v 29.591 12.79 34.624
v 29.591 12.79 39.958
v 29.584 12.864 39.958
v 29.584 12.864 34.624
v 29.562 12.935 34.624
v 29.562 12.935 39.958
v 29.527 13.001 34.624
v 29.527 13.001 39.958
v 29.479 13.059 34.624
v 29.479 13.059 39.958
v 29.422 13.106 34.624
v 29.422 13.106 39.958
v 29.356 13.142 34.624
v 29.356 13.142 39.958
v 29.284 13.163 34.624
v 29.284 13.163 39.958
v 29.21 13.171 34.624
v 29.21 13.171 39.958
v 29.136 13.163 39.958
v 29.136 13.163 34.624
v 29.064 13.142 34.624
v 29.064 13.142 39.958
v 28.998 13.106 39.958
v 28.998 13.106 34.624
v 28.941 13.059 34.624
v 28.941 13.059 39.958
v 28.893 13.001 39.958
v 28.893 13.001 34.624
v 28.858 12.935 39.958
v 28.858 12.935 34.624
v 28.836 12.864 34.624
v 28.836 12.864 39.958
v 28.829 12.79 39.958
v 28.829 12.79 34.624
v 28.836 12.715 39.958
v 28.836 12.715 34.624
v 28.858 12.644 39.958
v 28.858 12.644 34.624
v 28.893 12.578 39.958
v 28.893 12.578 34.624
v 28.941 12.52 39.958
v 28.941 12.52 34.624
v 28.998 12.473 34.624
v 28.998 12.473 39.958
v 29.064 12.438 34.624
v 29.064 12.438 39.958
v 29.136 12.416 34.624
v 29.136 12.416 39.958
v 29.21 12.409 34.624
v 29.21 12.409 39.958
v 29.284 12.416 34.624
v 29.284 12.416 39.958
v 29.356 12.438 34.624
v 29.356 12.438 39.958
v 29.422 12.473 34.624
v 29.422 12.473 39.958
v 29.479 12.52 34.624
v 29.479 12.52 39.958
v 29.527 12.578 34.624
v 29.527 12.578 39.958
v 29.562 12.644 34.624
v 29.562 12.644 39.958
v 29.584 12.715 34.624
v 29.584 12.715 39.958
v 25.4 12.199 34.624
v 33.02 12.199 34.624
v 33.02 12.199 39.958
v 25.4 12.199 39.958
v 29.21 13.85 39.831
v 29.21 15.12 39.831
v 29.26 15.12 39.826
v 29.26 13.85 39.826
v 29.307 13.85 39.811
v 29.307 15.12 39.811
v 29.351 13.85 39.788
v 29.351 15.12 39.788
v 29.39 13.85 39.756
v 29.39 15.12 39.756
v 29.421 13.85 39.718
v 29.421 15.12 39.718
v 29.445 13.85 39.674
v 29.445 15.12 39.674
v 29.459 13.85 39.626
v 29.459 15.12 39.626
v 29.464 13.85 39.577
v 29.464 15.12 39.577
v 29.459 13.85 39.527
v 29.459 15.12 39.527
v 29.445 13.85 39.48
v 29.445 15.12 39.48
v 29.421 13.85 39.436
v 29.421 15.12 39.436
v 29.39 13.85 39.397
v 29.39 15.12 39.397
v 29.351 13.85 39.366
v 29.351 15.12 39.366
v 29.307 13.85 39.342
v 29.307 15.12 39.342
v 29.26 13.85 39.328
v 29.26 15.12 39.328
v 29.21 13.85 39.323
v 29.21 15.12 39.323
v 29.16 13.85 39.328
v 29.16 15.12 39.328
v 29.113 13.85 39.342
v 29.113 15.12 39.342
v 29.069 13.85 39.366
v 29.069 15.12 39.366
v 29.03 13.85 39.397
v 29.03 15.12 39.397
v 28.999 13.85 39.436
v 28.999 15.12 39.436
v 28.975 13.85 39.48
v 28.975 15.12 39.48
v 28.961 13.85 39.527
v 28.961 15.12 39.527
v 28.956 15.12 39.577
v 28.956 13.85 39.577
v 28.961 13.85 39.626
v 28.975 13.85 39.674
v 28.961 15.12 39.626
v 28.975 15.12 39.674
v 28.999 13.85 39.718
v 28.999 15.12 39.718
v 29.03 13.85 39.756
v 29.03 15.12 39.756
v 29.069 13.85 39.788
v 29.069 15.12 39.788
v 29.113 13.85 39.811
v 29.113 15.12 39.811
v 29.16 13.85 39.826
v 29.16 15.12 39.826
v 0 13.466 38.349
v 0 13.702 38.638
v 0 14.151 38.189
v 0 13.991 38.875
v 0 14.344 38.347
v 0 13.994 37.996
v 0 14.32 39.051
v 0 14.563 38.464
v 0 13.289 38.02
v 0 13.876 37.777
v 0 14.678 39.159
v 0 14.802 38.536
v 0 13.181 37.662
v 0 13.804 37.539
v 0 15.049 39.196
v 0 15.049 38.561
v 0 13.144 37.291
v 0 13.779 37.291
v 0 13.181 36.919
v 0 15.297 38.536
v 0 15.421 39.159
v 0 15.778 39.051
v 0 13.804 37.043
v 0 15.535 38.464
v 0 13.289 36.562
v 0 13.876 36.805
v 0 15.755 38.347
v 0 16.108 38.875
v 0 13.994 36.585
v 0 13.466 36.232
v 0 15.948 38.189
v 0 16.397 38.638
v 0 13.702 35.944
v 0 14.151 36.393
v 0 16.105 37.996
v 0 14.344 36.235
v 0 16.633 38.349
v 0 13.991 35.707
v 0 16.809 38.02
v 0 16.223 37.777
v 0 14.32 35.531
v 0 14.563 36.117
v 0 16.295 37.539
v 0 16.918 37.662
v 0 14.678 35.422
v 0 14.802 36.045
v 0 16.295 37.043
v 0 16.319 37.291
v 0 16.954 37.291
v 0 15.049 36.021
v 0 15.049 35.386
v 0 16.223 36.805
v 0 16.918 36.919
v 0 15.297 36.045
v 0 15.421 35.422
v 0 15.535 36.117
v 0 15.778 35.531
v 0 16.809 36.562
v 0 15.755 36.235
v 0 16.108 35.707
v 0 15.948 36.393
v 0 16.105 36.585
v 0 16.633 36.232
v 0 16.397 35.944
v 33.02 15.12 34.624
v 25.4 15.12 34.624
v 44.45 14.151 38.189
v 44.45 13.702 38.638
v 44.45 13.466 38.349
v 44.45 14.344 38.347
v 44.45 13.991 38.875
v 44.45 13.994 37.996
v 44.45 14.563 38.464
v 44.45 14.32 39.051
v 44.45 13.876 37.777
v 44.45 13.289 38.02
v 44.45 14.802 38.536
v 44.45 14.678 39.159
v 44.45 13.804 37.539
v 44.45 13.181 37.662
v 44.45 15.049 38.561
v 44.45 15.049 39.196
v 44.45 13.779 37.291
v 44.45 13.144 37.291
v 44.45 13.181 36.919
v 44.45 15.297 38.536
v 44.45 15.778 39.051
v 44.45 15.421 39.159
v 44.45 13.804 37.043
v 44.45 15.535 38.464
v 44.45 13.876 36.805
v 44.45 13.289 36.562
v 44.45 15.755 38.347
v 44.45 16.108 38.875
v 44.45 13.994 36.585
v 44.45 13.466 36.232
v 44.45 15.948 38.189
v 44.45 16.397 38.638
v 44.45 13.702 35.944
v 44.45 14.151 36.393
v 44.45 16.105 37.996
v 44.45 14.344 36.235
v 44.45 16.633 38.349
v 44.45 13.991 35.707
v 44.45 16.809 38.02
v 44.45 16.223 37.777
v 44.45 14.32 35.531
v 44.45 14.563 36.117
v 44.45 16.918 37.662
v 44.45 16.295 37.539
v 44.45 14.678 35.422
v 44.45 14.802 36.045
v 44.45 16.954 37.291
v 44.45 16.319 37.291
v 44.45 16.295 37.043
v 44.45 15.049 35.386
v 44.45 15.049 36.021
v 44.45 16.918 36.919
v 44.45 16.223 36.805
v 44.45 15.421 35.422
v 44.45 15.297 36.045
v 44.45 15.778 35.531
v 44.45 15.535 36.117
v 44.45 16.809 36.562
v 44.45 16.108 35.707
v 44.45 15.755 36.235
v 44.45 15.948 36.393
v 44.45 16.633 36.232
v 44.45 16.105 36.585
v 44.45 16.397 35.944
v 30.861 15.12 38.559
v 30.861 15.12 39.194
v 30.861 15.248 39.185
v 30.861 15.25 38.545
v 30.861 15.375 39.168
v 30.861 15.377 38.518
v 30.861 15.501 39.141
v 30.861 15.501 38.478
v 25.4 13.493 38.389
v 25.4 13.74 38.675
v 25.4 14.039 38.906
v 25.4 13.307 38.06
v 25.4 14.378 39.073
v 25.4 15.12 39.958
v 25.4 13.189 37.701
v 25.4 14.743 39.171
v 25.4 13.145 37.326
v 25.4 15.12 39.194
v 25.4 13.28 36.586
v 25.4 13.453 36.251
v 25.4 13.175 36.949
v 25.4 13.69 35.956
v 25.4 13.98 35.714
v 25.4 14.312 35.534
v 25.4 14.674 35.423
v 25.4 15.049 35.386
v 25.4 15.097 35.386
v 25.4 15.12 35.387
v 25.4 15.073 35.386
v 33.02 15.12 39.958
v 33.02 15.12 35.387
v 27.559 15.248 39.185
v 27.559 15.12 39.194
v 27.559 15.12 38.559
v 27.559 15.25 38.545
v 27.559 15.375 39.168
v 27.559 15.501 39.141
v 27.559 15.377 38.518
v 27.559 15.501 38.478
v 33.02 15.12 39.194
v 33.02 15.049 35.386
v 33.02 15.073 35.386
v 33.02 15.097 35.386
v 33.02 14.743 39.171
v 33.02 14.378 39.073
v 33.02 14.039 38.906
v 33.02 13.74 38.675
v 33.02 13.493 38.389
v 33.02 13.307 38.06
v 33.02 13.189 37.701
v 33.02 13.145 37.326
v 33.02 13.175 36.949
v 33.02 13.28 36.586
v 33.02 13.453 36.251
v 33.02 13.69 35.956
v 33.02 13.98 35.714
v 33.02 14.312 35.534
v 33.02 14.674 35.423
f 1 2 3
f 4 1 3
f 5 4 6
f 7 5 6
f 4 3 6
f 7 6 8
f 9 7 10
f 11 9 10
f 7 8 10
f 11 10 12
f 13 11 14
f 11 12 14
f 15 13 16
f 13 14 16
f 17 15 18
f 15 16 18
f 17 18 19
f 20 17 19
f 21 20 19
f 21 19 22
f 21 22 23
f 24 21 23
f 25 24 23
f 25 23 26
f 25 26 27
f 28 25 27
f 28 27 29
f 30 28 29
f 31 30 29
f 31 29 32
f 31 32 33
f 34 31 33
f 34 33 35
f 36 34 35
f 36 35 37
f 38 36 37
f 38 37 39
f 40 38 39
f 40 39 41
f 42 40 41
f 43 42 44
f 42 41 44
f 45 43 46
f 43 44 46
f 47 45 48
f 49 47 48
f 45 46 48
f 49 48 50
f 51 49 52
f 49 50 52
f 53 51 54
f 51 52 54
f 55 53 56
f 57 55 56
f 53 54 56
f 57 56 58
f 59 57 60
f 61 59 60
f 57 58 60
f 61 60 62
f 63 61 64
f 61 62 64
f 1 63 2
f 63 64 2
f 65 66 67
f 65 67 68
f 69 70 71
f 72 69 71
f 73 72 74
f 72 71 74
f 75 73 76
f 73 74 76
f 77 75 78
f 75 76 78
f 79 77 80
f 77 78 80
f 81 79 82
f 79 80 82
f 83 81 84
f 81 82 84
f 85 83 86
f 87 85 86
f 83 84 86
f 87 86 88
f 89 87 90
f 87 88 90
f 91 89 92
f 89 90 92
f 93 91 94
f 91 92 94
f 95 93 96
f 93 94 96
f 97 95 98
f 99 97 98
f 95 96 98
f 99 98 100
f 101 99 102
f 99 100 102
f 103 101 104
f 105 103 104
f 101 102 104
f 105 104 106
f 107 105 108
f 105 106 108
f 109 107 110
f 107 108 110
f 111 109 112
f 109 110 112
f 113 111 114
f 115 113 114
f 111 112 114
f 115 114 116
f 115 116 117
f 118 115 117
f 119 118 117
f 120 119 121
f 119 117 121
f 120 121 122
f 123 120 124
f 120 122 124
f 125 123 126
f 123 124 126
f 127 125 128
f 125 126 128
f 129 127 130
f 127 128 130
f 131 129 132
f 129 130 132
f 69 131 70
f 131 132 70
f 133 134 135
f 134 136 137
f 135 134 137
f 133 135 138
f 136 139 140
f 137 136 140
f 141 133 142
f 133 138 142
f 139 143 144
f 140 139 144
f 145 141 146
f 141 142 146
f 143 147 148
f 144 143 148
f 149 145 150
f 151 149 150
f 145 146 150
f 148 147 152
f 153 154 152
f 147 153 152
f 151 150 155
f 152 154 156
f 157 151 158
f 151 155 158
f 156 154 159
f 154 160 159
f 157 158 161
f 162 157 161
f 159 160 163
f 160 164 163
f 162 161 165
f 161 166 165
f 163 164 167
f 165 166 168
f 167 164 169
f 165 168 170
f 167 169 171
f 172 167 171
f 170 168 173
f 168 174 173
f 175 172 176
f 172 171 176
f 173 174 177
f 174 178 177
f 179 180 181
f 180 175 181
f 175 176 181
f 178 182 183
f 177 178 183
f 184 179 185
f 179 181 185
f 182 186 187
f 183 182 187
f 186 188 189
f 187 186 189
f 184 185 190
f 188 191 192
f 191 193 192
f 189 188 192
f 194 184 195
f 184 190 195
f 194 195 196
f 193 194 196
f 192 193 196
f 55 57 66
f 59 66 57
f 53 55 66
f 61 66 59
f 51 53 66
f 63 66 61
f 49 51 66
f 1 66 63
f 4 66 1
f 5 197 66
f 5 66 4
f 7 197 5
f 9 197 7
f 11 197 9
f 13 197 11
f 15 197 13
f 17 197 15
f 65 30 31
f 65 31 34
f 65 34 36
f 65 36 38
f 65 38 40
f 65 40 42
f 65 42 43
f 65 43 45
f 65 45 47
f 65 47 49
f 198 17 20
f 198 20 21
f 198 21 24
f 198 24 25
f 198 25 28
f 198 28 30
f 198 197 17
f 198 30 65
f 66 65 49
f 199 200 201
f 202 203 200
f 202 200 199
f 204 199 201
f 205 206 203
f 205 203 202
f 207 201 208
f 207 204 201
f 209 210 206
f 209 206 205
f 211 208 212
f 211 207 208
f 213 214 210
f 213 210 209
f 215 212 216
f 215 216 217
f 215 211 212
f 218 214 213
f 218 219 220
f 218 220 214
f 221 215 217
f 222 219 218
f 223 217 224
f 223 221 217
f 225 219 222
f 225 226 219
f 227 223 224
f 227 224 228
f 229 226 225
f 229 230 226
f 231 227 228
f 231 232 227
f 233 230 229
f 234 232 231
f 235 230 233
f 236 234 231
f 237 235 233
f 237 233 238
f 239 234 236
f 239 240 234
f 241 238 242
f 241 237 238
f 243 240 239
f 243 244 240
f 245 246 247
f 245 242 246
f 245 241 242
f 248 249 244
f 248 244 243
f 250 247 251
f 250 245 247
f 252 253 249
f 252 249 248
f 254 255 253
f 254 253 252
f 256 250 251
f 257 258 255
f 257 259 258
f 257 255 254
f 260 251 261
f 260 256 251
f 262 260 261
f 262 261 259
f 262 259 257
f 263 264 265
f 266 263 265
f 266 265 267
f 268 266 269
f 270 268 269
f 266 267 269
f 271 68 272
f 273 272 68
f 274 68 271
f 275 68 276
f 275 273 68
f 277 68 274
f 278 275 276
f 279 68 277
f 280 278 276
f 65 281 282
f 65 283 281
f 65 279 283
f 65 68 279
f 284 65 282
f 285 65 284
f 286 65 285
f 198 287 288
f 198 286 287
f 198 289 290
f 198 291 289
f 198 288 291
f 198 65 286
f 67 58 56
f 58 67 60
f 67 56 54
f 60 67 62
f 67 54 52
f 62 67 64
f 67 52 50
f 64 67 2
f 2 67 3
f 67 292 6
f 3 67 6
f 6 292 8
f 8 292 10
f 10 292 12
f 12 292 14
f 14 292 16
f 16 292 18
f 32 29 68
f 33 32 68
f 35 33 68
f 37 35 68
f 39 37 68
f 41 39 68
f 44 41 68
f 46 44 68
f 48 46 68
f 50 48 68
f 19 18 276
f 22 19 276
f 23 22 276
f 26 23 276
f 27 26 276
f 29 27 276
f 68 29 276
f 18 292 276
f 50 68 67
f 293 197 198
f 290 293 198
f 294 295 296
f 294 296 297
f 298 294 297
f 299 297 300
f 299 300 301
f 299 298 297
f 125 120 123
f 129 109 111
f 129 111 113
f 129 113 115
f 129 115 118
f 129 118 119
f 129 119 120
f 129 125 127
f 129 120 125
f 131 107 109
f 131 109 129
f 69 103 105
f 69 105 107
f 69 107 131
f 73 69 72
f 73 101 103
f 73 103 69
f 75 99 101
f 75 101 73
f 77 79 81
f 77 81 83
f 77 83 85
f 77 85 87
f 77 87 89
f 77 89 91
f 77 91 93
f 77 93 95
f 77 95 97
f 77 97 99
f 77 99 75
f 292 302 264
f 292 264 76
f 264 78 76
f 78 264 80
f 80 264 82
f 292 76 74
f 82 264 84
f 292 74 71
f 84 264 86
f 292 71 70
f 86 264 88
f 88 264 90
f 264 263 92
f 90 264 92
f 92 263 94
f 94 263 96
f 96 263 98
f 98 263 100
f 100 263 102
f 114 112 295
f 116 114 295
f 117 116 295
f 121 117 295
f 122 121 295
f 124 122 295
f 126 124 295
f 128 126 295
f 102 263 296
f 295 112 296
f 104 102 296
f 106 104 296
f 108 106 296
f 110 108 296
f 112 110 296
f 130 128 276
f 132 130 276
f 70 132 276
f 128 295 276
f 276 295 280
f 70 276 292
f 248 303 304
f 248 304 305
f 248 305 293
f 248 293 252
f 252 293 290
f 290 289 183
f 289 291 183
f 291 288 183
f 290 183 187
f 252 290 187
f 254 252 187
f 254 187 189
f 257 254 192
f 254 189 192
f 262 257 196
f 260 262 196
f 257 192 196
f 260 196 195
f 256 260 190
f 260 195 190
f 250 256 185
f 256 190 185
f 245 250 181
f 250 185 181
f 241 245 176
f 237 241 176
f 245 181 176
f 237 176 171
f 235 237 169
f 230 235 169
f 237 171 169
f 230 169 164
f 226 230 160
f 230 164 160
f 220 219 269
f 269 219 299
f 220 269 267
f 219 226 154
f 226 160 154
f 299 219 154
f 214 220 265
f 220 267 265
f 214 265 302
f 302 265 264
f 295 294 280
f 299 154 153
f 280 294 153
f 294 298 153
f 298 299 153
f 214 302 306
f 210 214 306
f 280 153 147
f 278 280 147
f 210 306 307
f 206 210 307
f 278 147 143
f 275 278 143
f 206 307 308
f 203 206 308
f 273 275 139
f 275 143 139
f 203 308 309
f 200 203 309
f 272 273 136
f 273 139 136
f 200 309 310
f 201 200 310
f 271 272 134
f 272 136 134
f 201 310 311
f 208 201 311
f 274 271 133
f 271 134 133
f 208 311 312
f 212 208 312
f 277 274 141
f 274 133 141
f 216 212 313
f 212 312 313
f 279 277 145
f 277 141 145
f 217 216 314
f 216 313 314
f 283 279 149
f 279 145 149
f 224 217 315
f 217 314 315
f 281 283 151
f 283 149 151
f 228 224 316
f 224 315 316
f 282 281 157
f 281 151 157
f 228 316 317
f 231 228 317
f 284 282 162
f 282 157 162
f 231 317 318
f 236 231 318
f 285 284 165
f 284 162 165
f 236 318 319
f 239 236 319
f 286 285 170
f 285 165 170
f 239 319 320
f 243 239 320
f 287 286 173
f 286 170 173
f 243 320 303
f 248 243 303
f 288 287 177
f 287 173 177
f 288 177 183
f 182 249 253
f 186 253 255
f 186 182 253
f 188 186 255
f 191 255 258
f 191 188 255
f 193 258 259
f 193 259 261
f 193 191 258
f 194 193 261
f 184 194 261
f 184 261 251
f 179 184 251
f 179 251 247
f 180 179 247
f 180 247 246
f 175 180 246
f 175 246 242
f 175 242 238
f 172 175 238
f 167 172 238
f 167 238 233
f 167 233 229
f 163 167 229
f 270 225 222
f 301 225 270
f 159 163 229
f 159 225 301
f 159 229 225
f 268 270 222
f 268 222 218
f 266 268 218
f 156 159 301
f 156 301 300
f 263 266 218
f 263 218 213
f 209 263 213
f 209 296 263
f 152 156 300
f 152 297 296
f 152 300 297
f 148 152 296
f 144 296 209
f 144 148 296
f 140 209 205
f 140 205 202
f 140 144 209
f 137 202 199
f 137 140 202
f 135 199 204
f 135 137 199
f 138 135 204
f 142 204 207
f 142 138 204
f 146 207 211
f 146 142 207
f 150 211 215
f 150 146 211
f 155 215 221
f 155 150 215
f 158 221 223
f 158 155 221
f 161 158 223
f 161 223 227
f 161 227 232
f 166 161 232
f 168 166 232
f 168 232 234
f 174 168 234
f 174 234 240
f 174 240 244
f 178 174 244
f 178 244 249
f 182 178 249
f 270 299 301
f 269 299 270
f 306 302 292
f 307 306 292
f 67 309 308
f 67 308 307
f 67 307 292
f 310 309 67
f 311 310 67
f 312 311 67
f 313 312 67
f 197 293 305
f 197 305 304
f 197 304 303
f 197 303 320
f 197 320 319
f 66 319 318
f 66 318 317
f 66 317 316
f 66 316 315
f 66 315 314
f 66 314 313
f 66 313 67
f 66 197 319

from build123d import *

# Parameters (mm, degrees)
SKETCH1_R                = 1.905
SKETCH1_R_2              = 1.27
BOSS_EXTRUDE1_DEPTH      = 44.45
BOSS_EXTRUDE3_DEPTH      = 0.762
BOSS_EXTRUDE3_DEPTH_BACK = 4.572
SKETCH4_R                = 1.27
CUT_EXTRUDE2_DEPTH       = 46.99
SKETCH5_W                = 3.302
SKETCH5_H                = 0.381
CUT_EXTRUDE3_DEPTH       = 1.016
SKETCH6_R                = 0.381
CUT_EXTRUDE4_DEPTH       = 5.588
SKETCH8_R                = 0.254
CUT_EXTRUDE5_DEPTH       = 1.27


with BuildPart() as part:
    # Sketch1 → Boss-Extrude1 (new body)
    with BuildSketch(Plane(origin=(0, 0, 0), x_dir=(0, 0, -1), z_dir=(1, 0, 0))):
        with Locations((-37.290755903, 15.049483632)):
            Circle(SKETCH1_R)
        with Locations((-37.290755903, 15.049483632)):
            Circle(SKETCH1_R_2, mode=Mode.SUBTRACT)
    extrude(amount=BOSS_EXTRUDE1_DEPTH)

    # Sketch2 → Boss-Extrude3 (add, two sides: drawn at the far end of the back side and taken through both)
    with BuildSketch(Plane.XY.offset(39.195755903).offset(-BOSS_EXTRUDE3_DEPTH_BACK)):
        Polygon((32.385, 15.120134353), (33.02, 15.120134353), (33.02, 12.199134353), (25.4, 12.199134353), (25.4, 15.120134353), (26.035, 15.120134353), (31.75, 15.120134353), align=None)
    extrude(amount=BOSS_EXTRUDE3_DEPTH + BOSS_EXTRUDE3_DEPTH_BACK)

    # Sketch4 → Cut-Extrude2 (cut)
    with BuildSketch(Plane.ZY):
        with Locations(Location((37.290755903, 15.049483632, 0), (0, 0, 180))):
            Circle(SKETCH4_R)
    extrude(amount=-CUT_EXTRUDE2_DEPTH, mode=Mode.SUBTRACT)

    # Sketch5 → Cut-Extrude3 (cut)
    with BuildSketch(Plane.XY.offset(39.195755903)):
        with Locations((29.21, 15.310634353)):
            Rectangle(SKETCH5_W, SKETCH5_H)
    extrude(amount=-CUT_EXTRUDE3_DEPTH, mode=Mode.SUBTRACT)

    # Sketch6 → Cut-Extrude4 (cut)
    with BuildSketch(Plane.XY.offset(39.957755903)):
        with Locations((29.21, 12.789684353)):
            Circle(SKETCH6_R)
    extrude(amount=-CUT_EXTRUDE4_DEPTH, mode=Mode.SUBTRACT)

    # Sketch8 → Cut-Extrude5 (cut)
    with BuildSketch(Plane(origin=(0, 15.120134353, 0), x_dir=(1, 0, 0), z_dir=(0, 1, 0))):
        with Locations(Location((29.21, -39.576755903, 0), (0, 0, 270))):
            Circle(SKETCH8_R)
    extrude(amount=-CUT_EXTRUDE5_DEPTH, mode=Mode.SUBTRACT)


solid = part.part
